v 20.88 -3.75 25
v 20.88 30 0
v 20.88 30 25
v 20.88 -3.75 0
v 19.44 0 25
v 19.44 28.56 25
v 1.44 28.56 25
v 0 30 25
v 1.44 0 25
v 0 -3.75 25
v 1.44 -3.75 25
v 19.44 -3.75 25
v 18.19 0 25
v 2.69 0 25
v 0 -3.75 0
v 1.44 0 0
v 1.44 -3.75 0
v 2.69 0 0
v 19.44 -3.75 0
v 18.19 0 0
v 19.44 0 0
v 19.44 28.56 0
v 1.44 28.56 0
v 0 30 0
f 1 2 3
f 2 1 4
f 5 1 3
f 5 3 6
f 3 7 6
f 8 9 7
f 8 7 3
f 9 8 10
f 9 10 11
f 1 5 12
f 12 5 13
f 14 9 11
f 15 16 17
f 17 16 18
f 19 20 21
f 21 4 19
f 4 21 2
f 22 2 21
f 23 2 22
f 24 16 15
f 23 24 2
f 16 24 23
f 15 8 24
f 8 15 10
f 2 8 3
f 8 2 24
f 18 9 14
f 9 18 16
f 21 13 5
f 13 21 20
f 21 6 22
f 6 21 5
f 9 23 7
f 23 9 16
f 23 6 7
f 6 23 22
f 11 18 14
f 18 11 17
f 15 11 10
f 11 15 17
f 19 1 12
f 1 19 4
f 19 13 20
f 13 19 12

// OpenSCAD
// file: ../common.scad
// Common modules for use across models

epsilon=0.02;

module hollow_cylinder(h,d_inner,d_outer) {
  difference() {
    cylinder(h=h,d=d_outer);
    translate([0,0,-epsilon/2]) {
      cylinder(h=h+epsilon, d=d_inner);
    }
  }
}

module hollow_prism(h, lx_outer, lx_inner, ly_outer, ly_inner) {
  difference() {
    cube([lx_outer, ly_outer, h]);
    translate([(lx_outer-lx_inner)/2,(ly_outer-ly_inner)/2,-epsilon/2]) {
      cube([lx_inner, ly_inner,h+epsilon]);
    }
  }
}

module right_triangle(lx, ly) {
  polygon(points=[[0,0],
                  [lx,0],
                  [0,ly], 
                  [0,0]]);
}
// main file
include <../common.scad>;

extrusion_width=0.36;
inside_width=18;
wall_thickness=extrusion_width*4;
outside_width=inside_width+wall_thickness*2;
barb_extension=1.25;
barb_slope=3;
barb_length=barb_extension*barb_slope;
length=25;
height=30;

module barb() {
  difference() {
    scale([1,3,1]) {
      linear_extrude(height=length) {
        right_triangle(lx=wall_thickness*2,ly=wall_thickness*2);
      }
    }
    translate([-epsilon,wall_thickness*3,-epsilon/2])
      cube([wall_thickness*3,wall_thickness*10,height+epsilon]);
  }
}

module barb() {
  linear_extrude(height=length) {
    polygon([[0,0],
             [wall_thickness+barb_extension,0],
             [wall_thickness,barb_length],
             [0,barb_length]]);
  }
}

union() {
  difference() {
    cube([outside_width, height, length]);
    translate([(outside_width-inside_width)/2,
               -epsilon,
               -epsilon/2]) {
      cube([inside_width, height-wall_thickness+epsilon, length+epsilon]);
    }
  }
  mirror([0,1,0]) {
    barb();
  }
  translate([outside_width,0,0]) {
    mirror([0,1,0]) {
      mirror([1,0,0]) {
        barb();
      }
    }
  }
}
